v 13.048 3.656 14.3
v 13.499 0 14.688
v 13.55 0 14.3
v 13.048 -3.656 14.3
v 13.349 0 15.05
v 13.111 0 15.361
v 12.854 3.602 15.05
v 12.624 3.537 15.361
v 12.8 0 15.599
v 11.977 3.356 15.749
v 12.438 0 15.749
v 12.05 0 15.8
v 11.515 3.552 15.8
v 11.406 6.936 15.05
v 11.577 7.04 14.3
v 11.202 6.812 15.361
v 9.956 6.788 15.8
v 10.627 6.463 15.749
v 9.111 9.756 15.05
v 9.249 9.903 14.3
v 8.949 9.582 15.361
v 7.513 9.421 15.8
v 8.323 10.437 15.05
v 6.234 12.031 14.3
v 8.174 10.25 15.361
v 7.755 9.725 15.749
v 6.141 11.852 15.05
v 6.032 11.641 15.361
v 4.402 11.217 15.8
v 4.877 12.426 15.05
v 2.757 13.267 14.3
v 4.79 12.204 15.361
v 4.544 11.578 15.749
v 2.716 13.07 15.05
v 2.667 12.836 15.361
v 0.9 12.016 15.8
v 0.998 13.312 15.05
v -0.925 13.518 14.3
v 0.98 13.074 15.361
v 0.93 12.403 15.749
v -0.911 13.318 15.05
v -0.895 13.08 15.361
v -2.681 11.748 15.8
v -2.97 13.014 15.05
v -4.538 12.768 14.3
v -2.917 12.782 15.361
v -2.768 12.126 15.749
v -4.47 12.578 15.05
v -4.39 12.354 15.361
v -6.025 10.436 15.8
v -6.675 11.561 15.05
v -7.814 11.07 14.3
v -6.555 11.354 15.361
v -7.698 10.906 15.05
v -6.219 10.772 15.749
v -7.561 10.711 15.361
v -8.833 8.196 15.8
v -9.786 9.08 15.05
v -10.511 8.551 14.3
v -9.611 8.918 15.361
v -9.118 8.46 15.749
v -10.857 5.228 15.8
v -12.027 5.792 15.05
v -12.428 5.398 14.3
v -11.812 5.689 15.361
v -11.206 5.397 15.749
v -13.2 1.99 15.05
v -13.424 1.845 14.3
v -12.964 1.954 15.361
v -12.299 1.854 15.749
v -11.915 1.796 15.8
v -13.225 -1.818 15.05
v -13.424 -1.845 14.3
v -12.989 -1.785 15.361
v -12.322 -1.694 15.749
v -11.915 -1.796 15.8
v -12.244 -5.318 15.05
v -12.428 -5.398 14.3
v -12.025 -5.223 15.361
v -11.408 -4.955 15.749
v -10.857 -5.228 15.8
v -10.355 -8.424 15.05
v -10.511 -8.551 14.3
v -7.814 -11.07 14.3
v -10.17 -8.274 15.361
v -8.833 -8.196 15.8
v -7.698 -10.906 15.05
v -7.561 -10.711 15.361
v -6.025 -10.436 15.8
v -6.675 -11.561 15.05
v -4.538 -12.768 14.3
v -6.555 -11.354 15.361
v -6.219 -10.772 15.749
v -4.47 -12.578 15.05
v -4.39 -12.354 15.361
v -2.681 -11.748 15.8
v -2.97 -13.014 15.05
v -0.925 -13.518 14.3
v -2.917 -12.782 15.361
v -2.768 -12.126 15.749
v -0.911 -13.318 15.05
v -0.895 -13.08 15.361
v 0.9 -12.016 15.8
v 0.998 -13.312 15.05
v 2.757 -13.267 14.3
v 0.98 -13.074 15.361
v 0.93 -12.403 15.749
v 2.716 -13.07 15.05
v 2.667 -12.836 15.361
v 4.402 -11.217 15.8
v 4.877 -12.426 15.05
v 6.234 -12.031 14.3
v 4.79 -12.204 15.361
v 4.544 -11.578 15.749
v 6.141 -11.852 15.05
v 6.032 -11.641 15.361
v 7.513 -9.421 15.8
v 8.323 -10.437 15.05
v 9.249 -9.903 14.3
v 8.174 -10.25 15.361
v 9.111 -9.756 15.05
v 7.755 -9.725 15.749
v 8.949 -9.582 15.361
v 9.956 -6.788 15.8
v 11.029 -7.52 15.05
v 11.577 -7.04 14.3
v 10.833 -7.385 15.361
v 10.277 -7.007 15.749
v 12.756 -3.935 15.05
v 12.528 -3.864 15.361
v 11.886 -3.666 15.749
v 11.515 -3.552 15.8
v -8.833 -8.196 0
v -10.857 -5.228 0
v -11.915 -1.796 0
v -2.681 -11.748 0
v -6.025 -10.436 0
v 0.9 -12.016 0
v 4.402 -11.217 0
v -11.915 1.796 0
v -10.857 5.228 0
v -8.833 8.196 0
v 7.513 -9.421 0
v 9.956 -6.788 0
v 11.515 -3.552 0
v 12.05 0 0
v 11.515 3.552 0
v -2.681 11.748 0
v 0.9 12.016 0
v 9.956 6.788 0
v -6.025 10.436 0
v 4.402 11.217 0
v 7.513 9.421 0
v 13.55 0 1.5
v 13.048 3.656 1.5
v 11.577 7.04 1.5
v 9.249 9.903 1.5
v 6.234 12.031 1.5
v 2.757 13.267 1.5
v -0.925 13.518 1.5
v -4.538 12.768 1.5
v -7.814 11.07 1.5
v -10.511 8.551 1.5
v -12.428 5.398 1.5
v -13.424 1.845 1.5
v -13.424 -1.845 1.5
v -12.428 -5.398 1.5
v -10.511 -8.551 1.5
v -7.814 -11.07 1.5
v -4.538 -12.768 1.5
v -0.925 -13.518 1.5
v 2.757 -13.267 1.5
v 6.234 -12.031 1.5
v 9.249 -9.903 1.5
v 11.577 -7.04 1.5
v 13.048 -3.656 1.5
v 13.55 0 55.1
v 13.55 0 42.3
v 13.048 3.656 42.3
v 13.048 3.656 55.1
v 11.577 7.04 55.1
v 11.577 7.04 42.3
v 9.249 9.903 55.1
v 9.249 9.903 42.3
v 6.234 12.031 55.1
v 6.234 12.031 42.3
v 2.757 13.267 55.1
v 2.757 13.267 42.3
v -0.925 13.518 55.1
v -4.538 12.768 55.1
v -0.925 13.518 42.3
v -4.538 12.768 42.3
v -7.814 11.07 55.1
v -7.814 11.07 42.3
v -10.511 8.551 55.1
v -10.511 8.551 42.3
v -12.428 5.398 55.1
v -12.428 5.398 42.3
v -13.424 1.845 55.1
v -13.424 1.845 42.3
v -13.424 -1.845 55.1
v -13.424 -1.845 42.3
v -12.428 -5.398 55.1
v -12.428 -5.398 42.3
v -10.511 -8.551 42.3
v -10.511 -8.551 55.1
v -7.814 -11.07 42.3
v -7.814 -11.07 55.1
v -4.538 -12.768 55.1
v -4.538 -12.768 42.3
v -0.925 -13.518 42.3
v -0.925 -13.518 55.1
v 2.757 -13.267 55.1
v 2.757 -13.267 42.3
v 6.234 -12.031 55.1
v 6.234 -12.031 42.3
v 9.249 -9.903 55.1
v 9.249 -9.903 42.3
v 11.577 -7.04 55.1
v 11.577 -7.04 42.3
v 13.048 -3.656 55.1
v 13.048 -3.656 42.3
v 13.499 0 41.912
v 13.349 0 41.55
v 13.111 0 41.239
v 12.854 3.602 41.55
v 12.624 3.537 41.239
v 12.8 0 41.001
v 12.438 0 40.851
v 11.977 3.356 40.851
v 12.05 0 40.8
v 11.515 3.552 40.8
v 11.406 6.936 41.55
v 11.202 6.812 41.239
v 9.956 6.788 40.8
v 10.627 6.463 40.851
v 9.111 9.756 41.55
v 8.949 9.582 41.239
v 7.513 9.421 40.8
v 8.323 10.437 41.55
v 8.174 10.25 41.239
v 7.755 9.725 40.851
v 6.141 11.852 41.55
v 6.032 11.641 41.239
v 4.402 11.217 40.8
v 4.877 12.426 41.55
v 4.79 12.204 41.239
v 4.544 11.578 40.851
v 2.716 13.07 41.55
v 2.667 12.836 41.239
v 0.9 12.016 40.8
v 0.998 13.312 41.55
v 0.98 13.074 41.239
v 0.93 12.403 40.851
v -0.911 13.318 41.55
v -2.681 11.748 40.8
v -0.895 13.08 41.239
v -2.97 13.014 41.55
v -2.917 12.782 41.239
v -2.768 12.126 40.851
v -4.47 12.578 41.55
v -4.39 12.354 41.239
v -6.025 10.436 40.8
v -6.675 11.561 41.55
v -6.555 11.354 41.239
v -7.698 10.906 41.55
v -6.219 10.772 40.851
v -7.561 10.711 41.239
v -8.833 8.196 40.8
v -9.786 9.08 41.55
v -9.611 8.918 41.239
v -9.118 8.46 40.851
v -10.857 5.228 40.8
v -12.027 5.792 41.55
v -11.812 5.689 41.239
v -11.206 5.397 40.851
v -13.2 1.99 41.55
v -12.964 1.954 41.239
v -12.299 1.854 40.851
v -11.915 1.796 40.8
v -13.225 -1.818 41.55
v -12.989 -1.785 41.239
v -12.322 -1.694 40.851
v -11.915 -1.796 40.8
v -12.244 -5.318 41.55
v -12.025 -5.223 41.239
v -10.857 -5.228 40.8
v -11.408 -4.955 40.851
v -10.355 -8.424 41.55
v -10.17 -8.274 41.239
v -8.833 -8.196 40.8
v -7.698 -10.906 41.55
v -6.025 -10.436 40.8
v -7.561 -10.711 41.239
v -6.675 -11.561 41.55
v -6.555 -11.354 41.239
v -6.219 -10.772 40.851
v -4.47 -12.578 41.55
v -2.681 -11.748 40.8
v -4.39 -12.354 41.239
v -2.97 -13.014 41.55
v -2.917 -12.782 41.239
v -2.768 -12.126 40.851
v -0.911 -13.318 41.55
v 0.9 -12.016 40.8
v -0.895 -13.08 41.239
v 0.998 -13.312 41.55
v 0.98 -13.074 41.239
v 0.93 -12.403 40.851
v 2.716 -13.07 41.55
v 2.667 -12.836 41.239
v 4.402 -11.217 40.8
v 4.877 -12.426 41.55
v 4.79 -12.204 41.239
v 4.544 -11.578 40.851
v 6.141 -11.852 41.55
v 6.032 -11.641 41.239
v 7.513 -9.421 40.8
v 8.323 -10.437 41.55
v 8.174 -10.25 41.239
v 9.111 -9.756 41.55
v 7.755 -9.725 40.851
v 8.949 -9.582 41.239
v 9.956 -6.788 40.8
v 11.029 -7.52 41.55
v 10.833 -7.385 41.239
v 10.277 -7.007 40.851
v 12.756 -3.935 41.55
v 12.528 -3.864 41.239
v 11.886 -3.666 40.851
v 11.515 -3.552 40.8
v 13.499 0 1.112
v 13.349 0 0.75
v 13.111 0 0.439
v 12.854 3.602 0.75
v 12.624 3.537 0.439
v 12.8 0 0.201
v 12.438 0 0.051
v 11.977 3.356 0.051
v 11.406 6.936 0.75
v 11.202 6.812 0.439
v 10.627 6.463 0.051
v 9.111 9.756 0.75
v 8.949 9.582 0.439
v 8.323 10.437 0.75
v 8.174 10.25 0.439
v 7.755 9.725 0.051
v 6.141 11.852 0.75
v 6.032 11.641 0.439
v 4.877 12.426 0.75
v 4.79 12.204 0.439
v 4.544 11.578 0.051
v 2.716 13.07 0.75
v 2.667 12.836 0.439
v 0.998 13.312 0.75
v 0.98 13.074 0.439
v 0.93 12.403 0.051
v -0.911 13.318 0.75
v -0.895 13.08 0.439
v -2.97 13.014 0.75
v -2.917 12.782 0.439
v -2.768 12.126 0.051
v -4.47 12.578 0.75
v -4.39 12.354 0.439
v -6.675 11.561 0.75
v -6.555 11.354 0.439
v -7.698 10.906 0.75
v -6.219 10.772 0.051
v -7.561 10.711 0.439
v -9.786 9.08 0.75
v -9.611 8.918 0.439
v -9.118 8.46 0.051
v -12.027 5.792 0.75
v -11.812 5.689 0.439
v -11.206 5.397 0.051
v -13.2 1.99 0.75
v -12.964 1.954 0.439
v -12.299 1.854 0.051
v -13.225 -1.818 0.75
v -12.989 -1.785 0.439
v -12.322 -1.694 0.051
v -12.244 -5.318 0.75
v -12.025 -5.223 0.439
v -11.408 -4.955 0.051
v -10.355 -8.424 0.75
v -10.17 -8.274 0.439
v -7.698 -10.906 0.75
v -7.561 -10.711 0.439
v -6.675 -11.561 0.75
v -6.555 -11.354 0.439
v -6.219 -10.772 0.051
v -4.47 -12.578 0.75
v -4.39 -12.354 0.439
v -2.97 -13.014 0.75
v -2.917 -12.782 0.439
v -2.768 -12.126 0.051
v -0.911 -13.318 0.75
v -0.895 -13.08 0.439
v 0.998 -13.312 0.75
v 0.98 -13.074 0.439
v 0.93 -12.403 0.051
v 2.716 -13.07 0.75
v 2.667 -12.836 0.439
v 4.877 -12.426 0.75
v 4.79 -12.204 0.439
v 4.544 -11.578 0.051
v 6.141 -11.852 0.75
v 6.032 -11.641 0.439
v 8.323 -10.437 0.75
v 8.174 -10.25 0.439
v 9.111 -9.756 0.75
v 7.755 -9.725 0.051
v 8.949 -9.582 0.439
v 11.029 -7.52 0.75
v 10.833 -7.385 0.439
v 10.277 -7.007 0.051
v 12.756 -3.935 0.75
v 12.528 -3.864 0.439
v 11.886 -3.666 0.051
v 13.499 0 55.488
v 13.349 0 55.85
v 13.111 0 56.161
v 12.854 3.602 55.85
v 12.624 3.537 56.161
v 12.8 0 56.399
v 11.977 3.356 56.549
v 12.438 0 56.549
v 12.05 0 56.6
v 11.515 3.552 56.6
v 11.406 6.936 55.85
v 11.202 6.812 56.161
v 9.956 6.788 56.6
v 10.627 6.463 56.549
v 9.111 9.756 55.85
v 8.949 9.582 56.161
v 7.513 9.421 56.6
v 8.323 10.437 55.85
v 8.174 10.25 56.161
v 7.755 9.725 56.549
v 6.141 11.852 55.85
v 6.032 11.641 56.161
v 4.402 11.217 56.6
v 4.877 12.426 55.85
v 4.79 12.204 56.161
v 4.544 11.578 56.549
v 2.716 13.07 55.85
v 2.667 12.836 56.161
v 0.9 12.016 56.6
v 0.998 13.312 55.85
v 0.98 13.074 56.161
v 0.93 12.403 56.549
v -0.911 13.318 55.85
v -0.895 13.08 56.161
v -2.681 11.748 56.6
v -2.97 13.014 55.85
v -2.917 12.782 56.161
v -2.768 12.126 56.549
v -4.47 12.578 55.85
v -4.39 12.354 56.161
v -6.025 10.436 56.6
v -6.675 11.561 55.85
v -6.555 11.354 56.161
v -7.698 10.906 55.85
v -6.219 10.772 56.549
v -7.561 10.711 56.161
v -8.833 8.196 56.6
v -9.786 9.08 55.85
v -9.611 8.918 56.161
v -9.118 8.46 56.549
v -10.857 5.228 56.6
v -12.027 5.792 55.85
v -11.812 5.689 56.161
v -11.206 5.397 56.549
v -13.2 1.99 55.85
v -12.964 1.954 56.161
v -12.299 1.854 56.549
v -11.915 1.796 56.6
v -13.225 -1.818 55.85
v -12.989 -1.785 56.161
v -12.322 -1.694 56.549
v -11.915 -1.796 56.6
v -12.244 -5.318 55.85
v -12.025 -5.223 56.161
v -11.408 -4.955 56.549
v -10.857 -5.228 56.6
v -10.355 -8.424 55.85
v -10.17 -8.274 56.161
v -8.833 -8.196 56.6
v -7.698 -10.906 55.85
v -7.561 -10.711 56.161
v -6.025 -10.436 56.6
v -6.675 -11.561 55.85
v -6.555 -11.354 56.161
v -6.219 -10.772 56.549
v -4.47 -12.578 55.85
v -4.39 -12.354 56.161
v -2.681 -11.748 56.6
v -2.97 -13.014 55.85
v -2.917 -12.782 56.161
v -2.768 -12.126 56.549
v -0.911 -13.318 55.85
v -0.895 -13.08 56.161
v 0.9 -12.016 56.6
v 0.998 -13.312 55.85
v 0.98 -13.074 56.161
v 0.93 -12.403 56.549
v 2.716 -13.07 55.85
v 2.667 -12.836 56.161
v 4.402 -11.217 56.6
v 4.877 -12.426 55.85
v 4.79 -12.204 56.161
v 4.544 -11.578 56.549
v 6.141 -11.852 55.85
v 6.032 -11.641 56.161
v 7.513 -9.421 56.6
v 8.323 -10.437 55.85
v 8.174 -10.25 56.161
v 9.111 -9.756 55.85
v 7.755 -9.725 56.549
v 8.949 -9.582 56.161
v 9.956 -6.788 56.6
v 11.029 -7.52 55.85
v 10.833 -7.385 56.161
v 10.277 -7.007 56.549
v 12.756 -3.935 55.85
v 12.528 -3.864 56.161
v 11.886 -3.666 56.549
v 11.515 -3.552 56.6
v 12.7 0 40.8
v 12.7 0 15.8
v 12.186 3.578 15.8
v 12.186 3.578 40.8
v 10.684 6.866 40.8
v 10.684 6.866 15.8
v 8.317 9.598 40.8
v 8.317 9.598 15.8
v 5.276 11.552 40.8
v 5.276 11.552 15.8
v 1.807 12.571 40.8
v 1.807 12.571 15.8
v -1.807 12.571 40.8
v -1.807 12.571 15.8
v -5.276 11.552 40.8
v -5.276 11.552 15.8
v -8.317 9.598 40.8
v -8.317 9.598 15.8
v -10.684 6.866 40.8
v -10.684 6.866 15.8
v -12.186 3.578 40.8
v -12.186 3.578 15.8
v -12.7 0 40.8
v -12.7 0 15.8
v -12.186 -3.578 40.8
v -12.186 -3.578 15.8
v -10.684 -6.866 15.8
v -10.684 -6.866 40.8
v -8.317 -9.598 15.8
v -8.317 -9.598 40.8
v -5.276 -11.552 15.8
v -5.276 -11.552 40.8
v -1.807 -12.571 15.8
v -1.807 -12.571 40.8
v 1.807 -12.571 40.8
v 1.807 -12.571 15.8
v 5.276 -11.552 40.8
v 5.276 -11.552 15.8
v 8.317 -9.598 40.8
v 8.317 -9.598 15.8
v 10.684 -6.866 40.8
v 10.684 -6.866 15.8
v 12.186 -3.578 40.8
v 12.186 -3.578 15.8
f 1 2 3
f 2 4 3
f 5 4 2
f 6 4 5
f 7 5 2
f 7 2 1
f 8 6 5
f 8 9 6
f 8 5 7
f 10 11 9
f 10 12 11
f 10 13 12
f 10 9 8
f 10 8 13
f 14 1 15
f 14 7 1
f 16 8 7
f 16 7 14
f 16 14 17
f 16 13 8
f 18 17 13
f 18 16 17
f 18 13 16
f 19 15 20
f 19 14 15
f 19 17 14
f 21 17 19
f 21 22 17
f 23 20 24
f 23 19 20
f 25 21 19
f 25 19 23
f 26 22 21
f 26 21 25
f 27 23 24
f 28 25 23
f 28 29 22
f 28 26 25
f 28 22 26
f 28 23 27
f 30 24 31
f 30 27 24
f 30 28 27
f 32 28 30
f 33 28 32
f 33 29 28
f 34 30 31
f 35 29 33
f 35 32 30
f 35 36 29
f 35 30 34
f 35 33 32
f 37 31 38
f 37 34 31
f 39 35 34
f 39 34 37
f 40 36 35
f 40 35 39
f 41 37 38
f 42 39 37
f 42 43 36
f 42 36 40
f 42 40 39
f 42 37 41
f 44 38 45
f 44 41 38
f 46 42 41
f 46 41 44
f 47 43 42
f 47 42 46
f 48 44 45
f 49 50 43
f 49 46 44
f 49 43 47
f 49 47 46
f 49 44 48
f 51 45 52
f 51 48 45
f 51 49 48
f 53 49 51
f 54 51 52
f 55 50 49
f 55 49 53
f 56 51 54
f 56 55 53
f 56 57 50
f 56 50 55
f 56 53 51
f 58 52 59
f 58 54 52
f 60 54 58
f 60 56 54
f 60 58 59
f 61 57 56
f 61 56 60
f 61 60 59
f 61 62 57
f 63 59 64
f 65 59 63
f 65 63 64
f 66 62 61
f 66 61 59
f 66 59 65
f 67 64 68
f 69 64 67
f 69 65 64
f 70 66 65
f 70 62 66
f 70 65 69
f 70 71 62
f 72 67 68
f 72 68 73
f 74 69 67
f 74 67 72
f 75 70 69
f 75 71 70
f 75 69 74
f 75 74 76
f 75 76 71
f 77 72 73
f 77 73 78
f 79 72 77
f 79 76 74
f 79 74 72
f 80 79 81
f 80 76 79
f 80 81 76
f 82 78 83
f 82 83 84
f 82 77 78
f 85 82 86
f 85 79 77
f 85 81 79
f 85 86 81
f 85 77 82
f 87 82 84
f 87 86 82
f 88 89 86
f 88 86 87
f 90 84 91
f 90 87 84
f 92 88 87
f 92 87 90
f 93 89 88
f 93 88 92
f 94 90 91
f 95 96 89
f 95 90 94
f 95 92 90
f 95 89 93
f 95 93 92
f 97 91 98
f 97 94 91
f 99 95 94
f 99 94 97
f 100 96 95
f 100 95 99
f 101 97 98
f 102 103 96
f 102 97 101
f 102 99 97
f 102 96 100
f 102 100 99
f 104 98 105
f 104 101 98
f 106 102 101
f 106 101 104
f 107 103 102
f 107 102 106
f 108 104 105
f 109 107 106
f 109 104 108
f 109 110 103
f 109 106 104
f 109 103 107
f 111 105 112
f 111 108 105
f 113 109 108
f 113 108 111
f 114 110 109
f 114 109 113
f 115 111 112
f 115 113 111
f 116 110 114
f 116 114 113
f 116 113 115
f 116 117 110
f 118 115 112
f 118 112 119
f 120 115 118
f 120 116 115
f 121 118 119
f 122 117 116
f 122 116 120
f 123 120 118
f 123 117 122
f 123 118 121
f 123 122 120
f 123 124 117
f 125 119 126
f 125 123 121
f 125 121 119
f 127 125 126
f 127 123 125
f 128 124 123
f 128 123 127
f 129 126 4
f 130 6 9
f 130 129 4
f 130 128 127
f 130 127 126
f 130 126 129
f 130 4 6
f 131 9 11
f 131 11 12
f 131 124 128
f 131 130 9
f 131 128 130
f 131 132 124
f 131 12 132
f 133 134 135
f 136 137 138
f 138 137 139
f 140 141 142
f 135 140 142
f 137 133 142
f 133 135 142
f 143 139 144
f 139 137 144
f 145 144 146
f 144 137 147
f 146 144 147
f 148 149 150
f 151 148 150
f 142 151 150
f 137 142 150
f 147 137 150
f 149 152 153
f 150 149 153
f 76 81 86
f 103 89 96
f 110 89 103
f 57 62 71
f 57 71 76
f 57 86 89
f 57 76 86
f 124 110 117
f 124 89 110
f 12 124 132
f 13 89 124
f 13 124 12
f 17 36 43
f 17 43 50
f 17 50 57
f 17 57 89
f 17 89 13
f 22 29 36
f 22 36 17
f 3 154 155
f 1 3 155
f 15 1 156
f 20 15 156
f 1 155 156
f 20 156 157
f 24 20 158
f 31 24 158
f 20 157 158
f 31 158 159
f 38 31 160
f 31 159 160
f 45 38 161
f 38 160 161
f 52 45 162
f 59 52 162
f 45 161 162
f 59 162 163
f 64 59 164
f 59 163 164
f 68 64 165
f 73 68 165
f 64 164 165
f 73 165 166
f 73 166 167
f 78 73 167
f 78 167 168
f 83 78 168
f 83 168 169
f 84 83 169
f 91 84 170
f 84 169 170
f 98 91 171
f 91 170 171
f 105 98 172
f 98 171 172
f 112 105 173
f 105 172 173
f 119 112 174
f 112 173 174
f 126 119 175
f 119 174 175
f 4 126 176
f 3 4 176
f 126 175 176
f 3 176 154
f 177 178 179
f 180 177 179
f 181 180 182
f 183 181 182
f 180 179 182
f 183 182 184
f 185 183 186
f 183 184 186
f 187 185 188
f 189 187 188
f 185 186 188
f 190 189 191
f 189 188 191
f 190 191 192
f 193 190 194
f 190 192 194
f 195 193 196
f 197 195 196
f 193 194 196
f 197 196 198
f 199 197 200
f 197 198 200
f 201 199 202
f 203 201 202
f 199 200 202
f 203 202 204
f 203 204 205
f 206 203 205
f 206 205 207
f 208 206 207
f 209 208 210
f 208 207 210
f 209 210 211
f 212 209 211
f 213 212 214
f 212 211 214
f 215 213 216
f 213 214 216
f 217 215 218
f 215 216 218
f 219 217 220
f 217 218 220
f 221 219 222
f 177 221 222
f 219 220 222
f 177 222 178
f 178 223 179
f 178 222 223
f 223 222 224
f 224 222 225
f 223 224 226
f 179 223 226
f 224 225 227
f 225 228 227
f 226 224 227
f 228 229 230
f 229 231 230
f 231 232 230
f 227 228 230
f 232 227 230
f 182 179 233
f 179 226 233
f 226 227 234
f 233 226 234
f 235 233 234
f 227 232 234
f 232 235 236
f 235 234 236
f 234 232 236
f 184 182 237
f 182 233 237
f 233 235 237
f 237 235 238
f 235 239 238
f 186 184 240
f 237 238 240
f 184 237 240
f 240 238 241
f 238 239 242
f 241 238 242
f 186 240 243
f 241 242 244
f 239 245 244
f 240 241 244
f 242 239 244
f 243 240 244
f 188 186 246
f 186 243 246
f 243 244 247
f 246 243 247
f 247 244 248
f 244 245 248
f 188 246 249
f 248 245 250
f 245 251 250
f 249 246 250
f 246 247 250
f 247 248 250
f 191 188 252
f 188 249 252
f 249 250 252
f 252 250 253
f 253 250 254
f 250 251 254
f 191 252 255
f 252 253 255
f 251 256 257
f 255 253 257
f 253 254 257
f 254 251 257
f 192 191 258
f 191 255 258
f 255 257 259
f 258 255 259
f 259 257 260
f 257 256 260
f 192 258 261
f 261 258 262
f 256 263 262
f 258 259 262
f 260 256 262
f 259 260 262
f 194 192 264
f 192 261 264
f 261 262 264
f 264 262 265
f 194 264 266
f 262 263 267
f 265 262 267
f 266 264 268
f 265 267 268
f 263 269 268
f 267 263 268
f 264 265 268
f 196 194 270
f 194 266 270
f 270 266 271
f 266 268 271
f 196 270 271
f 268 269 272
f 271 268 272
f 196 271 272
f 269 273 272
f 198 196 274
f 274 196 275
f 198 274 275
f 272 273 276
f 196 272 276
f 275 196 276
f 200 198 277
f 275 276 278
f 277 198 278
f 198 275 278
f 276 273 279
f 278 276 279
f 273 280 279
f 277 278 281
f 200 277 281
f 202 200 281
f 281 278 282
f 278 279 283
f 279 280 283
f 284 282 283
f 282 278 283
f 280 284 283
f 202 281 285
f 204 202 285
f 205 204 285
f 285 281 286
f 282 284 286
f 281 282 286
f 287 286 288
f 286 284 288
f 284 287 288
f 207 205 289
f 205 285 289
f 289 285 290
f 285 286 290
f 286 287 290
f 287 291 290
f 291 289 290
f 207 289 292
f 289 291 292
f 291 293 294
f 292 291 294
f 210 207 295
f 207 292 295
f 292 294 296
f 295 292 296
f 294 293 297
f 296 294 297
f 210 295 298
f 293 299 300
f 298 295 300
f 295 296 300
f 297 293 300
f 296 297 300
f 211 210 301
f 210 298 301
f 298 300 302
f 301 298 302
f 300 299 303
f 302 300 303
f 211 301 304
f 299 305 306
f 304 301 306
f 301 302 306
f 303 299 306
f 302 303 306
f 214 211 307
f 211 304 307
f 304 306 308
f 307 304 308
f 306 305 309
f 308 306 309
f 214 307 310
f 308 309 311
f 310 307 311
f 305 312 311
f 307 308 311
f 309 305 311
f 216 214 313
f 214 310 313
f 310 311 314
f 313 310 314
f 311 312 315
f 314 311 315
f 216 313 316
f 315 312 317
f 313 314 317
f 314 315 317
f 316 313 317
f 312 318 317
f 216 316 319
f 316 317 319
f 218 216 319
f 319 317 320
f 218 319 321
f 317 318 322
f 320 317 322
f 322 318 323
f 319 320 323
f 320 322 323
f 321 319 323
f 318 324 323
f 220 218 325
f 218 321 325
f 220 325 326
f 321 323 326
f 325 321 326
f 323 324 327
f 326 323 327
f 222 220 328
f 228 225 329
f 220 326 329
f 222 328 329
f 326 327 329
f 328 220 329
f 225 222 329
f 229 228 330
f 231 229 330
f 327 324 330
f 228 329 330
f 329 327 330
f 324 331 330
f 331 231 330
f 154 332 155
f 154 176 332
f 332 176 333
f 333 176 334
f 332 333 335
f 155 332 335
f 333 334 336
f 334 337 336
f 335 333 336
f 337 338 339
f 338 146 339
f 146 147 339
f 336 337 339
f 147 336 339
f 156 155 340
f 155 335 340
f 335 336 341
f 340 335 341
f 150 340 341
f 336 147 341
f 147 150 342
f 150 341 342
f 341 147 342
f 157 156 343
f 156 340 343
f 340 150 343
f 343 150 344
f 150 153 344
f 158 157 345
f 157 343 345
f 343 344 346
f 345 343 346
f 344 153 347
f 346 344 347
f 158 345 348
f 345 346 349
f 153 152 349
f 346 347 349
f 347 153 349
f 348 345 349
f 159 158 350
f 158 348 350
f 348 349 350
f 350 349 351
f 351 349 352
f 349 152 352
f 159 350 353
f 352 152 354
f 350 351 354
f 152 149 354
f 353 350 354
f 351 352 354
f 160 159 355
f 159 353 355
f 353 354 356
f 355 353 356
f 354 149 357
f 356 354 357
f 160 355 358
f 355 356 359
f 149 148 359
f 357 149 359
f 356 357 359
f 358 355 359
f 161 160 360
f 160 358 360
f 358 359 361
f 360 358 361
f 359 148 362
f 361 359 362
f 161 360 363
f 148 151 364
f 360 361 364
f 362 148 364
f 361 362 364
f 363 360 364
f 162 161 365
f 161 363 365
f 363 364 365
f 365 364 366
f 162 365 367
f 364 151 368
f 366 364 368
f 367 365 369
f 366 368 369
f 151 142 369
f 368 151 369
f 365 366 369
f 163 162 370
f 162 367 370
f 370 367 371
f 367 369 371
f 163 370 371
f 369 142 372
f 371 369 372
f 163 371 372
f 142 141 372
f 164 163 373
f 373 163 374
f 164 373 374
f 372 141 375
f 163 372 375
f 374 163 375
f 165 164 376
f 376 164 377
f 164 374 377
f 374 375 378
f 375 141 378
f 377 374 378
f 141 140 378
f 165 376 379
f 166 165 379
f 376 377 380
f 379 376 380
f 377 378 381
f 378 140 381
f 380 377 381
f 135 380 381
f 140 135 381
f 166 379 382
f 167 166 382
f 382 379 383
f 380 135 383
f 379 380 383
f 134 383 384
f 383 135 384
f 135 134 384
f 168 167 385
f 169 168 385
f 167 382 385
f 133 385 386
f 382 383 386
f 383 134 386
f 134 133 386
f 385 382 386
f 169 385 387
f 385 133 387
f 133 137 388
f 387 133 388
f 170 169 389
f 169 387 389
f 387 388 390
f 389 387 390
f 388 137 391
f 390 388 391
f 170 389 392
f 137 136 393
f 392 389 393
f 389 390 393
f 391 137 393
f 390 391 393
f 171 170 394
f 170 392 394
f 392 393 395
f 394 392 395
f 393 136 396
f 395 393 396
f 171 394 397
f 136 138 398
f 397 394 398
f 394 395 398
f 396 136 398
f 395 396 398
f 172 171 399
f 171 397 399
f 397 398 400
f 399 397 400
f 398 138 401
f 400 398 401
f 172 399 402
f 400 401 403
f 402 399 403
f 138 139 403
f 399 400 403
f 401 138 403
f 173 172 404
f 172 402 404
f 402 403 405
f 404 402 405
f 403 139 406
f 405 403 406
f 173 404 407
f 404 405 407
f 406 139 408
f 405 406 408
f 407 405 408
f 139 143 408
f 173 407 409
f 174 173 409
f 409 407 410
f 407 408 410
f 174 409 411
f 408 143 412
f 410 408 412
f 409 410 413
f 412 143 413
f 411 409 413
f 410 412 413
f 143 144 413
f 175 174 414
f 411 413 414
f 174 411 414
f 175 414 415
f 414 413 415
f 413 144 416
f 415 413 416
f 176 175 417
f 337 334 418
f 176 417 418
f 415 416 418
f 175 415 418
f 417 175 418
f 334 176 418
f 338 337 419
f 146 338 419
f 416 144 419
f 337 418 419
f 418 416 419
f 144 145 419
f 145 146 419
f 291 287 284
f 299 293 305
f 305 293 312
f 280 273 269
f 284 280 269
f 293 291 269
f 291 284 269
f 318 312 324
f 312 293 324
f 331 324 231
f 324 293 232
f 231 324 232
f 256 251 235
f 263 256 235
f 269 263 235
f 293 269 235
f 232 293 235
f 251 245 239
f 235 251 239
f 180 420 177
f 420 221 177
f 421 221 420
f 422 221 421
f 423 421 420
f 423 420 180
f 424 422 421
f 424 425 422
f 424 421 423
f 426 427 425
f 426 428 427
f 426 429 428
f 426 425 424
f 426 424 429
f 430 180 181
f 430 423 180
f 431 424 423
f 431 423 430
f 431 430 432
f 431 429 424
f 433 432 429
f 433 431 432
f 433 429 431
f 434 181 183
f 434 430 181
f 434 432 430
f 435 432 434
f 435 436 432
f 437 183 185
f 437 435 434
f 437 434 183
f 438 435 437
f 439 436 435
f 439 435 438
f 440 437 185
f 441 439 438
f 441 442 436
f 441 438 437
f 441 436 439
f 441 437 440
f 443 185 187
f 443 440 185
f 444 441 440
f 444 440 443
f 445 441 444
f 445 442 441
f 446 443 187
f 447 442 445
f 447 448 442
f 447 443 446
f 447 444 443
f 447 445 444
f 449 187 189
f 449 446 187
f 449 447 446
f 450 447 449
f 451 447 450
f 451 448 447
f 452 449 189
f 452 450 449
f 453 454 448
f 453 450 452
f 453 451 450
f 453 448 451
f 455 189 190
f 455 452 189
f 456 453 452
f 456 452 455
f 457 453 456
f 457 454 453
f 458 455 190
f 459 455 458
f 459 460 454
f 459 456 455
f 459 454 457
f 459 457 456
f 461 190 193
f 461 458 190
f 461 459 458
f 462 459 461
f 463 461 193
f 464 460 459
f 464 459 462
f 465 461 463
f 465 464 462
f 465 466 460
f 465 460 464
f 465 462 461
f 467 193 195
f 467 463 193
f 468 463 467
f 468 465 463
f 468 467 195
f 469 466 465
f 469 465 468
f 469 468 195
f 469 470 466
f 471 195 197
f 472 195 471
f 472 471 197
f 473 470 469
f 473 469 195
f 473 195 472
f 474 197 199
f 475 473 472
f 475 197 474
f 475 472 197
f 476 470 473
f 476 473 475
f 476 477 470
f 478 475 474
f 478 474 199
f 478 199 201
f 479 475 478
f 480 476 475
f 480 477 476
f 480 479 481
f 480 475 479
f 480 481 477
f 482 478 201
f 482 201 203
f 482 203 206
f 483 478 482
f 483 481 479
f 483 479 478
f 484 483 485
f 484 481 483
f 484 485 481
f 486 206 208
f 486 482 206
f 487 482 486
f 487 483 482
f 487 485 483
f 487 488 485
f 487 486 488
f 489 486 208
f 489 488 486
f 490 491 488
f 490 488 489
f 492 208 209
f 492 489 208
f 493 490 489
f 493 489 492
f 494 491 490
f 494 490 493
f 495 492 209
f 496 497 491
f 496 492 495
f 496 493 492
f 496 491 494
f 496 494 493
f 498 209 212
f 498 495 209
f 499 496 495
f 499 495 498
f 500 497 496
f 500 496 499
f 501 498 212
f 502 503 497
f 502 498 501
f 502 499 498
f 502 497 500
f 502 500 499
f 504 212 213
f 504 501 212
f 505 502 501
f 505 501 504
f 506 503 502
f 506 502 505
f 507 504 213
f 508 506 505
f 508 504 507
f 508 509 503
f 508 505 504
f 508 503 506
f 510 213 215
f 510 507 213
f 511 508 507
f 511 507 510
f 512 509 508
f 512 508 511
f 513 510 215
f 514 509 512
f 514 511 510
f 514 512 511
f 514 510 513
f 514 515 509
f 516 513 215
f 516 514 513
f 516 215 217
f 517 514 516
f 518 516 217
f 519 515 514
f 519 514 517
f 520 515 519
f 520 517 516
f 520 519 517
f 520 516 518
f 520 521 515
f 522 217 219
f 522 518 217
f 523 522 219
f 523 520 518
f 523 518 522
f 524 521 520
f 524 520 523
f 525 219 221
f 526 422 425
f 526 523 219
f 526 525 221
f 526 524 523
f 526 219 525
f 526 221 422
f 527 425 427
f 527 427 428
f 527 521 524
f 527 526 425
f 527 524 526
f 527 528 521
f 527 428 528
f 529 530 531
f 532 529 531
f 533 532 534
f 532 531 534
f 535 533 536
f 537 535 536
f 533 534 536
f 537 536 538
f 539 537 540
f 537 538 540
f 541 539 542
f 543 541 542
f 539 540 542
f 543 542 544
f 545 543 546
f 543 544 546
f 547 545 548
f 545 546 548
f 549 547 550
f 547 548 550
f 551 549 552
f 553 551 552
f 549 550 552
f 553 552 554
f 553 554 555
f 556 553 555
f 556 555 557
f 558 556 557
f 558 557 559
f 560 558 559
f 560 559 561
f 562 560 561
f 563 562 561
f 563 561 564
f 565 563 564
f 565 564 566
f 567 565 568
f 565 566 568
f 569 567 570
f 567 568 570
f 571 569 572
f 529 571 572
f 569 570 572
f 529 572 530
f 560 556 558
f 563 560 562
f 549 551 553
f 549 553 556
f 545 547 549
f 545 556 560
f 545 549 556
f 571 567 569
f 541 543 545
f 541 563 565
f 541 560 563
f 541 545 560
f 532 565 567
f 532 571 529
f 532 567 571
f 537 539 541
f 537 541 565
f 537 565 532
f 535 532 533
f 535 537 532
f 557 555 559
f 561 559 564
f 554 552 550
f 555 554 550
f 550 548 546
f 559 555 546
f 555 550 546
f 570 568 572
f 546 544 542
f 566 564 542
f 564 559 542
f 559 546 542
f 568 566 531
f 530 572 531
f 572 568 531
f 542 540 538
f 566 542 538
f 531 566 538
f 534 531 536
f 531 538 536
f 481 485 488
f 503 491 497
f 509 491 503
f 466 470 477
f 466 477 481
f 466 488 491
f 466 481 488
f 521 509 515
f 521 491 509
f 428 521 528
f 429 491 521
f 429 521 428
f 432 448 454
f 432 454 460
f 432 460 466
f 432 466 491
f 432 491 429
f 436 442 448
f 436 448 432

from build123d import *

# Parameters (mm, degrees)
F0_R     = 13.55
F1_DEPTH = 15.8
F2_R     = 12.7
F3_DEPTH = 25
F4_R     = 13.55
F5_DEPTH = 15.8
F6_R     = 1.5
F6_2_R   = 1.5


with BuildPart() as f1:
    # F0 (on Top) → F1 (new body)
    with BuildSketch(Plane.XY):
        Circle(F0_R)
    extrude(amount=F1_DEPTH)

    # F6#2
    f6_2_edges = [f1.edges().sort_by_distance(p)[0] for p in [
        (-13.55, 0, 0),
        (-13.55, 0, 15.8),
    ]]
    fillet(f6_2_edges, radius=F6_2_R)


with BuildPart() as f3:
    # F2 (on face) → F3 (new body)
    with BuildSketch(Plane.XY.offset(15.8)):
        Circle(F2_R)
    extrude(amount=F3_DEPTH)


with BuildPart() as f5:
    # F4 (on face) → F5 (new body)
    with BuildSketch(Plane.XY.offset(40.8)):
        Circle(F4_R)
    extrude(amount=F5_DEPTH)

    # F6
    f6_edges = [f5.edges().sort_by_distance(p)[0] for p in [
        (-13.55, 0, 56.6),
        (-13.55, 0, 40.8),
    ]]
    fillet(f6_edges, radius=F6_R)


solid = Compound([f1.part, f3.part, f5.part])
